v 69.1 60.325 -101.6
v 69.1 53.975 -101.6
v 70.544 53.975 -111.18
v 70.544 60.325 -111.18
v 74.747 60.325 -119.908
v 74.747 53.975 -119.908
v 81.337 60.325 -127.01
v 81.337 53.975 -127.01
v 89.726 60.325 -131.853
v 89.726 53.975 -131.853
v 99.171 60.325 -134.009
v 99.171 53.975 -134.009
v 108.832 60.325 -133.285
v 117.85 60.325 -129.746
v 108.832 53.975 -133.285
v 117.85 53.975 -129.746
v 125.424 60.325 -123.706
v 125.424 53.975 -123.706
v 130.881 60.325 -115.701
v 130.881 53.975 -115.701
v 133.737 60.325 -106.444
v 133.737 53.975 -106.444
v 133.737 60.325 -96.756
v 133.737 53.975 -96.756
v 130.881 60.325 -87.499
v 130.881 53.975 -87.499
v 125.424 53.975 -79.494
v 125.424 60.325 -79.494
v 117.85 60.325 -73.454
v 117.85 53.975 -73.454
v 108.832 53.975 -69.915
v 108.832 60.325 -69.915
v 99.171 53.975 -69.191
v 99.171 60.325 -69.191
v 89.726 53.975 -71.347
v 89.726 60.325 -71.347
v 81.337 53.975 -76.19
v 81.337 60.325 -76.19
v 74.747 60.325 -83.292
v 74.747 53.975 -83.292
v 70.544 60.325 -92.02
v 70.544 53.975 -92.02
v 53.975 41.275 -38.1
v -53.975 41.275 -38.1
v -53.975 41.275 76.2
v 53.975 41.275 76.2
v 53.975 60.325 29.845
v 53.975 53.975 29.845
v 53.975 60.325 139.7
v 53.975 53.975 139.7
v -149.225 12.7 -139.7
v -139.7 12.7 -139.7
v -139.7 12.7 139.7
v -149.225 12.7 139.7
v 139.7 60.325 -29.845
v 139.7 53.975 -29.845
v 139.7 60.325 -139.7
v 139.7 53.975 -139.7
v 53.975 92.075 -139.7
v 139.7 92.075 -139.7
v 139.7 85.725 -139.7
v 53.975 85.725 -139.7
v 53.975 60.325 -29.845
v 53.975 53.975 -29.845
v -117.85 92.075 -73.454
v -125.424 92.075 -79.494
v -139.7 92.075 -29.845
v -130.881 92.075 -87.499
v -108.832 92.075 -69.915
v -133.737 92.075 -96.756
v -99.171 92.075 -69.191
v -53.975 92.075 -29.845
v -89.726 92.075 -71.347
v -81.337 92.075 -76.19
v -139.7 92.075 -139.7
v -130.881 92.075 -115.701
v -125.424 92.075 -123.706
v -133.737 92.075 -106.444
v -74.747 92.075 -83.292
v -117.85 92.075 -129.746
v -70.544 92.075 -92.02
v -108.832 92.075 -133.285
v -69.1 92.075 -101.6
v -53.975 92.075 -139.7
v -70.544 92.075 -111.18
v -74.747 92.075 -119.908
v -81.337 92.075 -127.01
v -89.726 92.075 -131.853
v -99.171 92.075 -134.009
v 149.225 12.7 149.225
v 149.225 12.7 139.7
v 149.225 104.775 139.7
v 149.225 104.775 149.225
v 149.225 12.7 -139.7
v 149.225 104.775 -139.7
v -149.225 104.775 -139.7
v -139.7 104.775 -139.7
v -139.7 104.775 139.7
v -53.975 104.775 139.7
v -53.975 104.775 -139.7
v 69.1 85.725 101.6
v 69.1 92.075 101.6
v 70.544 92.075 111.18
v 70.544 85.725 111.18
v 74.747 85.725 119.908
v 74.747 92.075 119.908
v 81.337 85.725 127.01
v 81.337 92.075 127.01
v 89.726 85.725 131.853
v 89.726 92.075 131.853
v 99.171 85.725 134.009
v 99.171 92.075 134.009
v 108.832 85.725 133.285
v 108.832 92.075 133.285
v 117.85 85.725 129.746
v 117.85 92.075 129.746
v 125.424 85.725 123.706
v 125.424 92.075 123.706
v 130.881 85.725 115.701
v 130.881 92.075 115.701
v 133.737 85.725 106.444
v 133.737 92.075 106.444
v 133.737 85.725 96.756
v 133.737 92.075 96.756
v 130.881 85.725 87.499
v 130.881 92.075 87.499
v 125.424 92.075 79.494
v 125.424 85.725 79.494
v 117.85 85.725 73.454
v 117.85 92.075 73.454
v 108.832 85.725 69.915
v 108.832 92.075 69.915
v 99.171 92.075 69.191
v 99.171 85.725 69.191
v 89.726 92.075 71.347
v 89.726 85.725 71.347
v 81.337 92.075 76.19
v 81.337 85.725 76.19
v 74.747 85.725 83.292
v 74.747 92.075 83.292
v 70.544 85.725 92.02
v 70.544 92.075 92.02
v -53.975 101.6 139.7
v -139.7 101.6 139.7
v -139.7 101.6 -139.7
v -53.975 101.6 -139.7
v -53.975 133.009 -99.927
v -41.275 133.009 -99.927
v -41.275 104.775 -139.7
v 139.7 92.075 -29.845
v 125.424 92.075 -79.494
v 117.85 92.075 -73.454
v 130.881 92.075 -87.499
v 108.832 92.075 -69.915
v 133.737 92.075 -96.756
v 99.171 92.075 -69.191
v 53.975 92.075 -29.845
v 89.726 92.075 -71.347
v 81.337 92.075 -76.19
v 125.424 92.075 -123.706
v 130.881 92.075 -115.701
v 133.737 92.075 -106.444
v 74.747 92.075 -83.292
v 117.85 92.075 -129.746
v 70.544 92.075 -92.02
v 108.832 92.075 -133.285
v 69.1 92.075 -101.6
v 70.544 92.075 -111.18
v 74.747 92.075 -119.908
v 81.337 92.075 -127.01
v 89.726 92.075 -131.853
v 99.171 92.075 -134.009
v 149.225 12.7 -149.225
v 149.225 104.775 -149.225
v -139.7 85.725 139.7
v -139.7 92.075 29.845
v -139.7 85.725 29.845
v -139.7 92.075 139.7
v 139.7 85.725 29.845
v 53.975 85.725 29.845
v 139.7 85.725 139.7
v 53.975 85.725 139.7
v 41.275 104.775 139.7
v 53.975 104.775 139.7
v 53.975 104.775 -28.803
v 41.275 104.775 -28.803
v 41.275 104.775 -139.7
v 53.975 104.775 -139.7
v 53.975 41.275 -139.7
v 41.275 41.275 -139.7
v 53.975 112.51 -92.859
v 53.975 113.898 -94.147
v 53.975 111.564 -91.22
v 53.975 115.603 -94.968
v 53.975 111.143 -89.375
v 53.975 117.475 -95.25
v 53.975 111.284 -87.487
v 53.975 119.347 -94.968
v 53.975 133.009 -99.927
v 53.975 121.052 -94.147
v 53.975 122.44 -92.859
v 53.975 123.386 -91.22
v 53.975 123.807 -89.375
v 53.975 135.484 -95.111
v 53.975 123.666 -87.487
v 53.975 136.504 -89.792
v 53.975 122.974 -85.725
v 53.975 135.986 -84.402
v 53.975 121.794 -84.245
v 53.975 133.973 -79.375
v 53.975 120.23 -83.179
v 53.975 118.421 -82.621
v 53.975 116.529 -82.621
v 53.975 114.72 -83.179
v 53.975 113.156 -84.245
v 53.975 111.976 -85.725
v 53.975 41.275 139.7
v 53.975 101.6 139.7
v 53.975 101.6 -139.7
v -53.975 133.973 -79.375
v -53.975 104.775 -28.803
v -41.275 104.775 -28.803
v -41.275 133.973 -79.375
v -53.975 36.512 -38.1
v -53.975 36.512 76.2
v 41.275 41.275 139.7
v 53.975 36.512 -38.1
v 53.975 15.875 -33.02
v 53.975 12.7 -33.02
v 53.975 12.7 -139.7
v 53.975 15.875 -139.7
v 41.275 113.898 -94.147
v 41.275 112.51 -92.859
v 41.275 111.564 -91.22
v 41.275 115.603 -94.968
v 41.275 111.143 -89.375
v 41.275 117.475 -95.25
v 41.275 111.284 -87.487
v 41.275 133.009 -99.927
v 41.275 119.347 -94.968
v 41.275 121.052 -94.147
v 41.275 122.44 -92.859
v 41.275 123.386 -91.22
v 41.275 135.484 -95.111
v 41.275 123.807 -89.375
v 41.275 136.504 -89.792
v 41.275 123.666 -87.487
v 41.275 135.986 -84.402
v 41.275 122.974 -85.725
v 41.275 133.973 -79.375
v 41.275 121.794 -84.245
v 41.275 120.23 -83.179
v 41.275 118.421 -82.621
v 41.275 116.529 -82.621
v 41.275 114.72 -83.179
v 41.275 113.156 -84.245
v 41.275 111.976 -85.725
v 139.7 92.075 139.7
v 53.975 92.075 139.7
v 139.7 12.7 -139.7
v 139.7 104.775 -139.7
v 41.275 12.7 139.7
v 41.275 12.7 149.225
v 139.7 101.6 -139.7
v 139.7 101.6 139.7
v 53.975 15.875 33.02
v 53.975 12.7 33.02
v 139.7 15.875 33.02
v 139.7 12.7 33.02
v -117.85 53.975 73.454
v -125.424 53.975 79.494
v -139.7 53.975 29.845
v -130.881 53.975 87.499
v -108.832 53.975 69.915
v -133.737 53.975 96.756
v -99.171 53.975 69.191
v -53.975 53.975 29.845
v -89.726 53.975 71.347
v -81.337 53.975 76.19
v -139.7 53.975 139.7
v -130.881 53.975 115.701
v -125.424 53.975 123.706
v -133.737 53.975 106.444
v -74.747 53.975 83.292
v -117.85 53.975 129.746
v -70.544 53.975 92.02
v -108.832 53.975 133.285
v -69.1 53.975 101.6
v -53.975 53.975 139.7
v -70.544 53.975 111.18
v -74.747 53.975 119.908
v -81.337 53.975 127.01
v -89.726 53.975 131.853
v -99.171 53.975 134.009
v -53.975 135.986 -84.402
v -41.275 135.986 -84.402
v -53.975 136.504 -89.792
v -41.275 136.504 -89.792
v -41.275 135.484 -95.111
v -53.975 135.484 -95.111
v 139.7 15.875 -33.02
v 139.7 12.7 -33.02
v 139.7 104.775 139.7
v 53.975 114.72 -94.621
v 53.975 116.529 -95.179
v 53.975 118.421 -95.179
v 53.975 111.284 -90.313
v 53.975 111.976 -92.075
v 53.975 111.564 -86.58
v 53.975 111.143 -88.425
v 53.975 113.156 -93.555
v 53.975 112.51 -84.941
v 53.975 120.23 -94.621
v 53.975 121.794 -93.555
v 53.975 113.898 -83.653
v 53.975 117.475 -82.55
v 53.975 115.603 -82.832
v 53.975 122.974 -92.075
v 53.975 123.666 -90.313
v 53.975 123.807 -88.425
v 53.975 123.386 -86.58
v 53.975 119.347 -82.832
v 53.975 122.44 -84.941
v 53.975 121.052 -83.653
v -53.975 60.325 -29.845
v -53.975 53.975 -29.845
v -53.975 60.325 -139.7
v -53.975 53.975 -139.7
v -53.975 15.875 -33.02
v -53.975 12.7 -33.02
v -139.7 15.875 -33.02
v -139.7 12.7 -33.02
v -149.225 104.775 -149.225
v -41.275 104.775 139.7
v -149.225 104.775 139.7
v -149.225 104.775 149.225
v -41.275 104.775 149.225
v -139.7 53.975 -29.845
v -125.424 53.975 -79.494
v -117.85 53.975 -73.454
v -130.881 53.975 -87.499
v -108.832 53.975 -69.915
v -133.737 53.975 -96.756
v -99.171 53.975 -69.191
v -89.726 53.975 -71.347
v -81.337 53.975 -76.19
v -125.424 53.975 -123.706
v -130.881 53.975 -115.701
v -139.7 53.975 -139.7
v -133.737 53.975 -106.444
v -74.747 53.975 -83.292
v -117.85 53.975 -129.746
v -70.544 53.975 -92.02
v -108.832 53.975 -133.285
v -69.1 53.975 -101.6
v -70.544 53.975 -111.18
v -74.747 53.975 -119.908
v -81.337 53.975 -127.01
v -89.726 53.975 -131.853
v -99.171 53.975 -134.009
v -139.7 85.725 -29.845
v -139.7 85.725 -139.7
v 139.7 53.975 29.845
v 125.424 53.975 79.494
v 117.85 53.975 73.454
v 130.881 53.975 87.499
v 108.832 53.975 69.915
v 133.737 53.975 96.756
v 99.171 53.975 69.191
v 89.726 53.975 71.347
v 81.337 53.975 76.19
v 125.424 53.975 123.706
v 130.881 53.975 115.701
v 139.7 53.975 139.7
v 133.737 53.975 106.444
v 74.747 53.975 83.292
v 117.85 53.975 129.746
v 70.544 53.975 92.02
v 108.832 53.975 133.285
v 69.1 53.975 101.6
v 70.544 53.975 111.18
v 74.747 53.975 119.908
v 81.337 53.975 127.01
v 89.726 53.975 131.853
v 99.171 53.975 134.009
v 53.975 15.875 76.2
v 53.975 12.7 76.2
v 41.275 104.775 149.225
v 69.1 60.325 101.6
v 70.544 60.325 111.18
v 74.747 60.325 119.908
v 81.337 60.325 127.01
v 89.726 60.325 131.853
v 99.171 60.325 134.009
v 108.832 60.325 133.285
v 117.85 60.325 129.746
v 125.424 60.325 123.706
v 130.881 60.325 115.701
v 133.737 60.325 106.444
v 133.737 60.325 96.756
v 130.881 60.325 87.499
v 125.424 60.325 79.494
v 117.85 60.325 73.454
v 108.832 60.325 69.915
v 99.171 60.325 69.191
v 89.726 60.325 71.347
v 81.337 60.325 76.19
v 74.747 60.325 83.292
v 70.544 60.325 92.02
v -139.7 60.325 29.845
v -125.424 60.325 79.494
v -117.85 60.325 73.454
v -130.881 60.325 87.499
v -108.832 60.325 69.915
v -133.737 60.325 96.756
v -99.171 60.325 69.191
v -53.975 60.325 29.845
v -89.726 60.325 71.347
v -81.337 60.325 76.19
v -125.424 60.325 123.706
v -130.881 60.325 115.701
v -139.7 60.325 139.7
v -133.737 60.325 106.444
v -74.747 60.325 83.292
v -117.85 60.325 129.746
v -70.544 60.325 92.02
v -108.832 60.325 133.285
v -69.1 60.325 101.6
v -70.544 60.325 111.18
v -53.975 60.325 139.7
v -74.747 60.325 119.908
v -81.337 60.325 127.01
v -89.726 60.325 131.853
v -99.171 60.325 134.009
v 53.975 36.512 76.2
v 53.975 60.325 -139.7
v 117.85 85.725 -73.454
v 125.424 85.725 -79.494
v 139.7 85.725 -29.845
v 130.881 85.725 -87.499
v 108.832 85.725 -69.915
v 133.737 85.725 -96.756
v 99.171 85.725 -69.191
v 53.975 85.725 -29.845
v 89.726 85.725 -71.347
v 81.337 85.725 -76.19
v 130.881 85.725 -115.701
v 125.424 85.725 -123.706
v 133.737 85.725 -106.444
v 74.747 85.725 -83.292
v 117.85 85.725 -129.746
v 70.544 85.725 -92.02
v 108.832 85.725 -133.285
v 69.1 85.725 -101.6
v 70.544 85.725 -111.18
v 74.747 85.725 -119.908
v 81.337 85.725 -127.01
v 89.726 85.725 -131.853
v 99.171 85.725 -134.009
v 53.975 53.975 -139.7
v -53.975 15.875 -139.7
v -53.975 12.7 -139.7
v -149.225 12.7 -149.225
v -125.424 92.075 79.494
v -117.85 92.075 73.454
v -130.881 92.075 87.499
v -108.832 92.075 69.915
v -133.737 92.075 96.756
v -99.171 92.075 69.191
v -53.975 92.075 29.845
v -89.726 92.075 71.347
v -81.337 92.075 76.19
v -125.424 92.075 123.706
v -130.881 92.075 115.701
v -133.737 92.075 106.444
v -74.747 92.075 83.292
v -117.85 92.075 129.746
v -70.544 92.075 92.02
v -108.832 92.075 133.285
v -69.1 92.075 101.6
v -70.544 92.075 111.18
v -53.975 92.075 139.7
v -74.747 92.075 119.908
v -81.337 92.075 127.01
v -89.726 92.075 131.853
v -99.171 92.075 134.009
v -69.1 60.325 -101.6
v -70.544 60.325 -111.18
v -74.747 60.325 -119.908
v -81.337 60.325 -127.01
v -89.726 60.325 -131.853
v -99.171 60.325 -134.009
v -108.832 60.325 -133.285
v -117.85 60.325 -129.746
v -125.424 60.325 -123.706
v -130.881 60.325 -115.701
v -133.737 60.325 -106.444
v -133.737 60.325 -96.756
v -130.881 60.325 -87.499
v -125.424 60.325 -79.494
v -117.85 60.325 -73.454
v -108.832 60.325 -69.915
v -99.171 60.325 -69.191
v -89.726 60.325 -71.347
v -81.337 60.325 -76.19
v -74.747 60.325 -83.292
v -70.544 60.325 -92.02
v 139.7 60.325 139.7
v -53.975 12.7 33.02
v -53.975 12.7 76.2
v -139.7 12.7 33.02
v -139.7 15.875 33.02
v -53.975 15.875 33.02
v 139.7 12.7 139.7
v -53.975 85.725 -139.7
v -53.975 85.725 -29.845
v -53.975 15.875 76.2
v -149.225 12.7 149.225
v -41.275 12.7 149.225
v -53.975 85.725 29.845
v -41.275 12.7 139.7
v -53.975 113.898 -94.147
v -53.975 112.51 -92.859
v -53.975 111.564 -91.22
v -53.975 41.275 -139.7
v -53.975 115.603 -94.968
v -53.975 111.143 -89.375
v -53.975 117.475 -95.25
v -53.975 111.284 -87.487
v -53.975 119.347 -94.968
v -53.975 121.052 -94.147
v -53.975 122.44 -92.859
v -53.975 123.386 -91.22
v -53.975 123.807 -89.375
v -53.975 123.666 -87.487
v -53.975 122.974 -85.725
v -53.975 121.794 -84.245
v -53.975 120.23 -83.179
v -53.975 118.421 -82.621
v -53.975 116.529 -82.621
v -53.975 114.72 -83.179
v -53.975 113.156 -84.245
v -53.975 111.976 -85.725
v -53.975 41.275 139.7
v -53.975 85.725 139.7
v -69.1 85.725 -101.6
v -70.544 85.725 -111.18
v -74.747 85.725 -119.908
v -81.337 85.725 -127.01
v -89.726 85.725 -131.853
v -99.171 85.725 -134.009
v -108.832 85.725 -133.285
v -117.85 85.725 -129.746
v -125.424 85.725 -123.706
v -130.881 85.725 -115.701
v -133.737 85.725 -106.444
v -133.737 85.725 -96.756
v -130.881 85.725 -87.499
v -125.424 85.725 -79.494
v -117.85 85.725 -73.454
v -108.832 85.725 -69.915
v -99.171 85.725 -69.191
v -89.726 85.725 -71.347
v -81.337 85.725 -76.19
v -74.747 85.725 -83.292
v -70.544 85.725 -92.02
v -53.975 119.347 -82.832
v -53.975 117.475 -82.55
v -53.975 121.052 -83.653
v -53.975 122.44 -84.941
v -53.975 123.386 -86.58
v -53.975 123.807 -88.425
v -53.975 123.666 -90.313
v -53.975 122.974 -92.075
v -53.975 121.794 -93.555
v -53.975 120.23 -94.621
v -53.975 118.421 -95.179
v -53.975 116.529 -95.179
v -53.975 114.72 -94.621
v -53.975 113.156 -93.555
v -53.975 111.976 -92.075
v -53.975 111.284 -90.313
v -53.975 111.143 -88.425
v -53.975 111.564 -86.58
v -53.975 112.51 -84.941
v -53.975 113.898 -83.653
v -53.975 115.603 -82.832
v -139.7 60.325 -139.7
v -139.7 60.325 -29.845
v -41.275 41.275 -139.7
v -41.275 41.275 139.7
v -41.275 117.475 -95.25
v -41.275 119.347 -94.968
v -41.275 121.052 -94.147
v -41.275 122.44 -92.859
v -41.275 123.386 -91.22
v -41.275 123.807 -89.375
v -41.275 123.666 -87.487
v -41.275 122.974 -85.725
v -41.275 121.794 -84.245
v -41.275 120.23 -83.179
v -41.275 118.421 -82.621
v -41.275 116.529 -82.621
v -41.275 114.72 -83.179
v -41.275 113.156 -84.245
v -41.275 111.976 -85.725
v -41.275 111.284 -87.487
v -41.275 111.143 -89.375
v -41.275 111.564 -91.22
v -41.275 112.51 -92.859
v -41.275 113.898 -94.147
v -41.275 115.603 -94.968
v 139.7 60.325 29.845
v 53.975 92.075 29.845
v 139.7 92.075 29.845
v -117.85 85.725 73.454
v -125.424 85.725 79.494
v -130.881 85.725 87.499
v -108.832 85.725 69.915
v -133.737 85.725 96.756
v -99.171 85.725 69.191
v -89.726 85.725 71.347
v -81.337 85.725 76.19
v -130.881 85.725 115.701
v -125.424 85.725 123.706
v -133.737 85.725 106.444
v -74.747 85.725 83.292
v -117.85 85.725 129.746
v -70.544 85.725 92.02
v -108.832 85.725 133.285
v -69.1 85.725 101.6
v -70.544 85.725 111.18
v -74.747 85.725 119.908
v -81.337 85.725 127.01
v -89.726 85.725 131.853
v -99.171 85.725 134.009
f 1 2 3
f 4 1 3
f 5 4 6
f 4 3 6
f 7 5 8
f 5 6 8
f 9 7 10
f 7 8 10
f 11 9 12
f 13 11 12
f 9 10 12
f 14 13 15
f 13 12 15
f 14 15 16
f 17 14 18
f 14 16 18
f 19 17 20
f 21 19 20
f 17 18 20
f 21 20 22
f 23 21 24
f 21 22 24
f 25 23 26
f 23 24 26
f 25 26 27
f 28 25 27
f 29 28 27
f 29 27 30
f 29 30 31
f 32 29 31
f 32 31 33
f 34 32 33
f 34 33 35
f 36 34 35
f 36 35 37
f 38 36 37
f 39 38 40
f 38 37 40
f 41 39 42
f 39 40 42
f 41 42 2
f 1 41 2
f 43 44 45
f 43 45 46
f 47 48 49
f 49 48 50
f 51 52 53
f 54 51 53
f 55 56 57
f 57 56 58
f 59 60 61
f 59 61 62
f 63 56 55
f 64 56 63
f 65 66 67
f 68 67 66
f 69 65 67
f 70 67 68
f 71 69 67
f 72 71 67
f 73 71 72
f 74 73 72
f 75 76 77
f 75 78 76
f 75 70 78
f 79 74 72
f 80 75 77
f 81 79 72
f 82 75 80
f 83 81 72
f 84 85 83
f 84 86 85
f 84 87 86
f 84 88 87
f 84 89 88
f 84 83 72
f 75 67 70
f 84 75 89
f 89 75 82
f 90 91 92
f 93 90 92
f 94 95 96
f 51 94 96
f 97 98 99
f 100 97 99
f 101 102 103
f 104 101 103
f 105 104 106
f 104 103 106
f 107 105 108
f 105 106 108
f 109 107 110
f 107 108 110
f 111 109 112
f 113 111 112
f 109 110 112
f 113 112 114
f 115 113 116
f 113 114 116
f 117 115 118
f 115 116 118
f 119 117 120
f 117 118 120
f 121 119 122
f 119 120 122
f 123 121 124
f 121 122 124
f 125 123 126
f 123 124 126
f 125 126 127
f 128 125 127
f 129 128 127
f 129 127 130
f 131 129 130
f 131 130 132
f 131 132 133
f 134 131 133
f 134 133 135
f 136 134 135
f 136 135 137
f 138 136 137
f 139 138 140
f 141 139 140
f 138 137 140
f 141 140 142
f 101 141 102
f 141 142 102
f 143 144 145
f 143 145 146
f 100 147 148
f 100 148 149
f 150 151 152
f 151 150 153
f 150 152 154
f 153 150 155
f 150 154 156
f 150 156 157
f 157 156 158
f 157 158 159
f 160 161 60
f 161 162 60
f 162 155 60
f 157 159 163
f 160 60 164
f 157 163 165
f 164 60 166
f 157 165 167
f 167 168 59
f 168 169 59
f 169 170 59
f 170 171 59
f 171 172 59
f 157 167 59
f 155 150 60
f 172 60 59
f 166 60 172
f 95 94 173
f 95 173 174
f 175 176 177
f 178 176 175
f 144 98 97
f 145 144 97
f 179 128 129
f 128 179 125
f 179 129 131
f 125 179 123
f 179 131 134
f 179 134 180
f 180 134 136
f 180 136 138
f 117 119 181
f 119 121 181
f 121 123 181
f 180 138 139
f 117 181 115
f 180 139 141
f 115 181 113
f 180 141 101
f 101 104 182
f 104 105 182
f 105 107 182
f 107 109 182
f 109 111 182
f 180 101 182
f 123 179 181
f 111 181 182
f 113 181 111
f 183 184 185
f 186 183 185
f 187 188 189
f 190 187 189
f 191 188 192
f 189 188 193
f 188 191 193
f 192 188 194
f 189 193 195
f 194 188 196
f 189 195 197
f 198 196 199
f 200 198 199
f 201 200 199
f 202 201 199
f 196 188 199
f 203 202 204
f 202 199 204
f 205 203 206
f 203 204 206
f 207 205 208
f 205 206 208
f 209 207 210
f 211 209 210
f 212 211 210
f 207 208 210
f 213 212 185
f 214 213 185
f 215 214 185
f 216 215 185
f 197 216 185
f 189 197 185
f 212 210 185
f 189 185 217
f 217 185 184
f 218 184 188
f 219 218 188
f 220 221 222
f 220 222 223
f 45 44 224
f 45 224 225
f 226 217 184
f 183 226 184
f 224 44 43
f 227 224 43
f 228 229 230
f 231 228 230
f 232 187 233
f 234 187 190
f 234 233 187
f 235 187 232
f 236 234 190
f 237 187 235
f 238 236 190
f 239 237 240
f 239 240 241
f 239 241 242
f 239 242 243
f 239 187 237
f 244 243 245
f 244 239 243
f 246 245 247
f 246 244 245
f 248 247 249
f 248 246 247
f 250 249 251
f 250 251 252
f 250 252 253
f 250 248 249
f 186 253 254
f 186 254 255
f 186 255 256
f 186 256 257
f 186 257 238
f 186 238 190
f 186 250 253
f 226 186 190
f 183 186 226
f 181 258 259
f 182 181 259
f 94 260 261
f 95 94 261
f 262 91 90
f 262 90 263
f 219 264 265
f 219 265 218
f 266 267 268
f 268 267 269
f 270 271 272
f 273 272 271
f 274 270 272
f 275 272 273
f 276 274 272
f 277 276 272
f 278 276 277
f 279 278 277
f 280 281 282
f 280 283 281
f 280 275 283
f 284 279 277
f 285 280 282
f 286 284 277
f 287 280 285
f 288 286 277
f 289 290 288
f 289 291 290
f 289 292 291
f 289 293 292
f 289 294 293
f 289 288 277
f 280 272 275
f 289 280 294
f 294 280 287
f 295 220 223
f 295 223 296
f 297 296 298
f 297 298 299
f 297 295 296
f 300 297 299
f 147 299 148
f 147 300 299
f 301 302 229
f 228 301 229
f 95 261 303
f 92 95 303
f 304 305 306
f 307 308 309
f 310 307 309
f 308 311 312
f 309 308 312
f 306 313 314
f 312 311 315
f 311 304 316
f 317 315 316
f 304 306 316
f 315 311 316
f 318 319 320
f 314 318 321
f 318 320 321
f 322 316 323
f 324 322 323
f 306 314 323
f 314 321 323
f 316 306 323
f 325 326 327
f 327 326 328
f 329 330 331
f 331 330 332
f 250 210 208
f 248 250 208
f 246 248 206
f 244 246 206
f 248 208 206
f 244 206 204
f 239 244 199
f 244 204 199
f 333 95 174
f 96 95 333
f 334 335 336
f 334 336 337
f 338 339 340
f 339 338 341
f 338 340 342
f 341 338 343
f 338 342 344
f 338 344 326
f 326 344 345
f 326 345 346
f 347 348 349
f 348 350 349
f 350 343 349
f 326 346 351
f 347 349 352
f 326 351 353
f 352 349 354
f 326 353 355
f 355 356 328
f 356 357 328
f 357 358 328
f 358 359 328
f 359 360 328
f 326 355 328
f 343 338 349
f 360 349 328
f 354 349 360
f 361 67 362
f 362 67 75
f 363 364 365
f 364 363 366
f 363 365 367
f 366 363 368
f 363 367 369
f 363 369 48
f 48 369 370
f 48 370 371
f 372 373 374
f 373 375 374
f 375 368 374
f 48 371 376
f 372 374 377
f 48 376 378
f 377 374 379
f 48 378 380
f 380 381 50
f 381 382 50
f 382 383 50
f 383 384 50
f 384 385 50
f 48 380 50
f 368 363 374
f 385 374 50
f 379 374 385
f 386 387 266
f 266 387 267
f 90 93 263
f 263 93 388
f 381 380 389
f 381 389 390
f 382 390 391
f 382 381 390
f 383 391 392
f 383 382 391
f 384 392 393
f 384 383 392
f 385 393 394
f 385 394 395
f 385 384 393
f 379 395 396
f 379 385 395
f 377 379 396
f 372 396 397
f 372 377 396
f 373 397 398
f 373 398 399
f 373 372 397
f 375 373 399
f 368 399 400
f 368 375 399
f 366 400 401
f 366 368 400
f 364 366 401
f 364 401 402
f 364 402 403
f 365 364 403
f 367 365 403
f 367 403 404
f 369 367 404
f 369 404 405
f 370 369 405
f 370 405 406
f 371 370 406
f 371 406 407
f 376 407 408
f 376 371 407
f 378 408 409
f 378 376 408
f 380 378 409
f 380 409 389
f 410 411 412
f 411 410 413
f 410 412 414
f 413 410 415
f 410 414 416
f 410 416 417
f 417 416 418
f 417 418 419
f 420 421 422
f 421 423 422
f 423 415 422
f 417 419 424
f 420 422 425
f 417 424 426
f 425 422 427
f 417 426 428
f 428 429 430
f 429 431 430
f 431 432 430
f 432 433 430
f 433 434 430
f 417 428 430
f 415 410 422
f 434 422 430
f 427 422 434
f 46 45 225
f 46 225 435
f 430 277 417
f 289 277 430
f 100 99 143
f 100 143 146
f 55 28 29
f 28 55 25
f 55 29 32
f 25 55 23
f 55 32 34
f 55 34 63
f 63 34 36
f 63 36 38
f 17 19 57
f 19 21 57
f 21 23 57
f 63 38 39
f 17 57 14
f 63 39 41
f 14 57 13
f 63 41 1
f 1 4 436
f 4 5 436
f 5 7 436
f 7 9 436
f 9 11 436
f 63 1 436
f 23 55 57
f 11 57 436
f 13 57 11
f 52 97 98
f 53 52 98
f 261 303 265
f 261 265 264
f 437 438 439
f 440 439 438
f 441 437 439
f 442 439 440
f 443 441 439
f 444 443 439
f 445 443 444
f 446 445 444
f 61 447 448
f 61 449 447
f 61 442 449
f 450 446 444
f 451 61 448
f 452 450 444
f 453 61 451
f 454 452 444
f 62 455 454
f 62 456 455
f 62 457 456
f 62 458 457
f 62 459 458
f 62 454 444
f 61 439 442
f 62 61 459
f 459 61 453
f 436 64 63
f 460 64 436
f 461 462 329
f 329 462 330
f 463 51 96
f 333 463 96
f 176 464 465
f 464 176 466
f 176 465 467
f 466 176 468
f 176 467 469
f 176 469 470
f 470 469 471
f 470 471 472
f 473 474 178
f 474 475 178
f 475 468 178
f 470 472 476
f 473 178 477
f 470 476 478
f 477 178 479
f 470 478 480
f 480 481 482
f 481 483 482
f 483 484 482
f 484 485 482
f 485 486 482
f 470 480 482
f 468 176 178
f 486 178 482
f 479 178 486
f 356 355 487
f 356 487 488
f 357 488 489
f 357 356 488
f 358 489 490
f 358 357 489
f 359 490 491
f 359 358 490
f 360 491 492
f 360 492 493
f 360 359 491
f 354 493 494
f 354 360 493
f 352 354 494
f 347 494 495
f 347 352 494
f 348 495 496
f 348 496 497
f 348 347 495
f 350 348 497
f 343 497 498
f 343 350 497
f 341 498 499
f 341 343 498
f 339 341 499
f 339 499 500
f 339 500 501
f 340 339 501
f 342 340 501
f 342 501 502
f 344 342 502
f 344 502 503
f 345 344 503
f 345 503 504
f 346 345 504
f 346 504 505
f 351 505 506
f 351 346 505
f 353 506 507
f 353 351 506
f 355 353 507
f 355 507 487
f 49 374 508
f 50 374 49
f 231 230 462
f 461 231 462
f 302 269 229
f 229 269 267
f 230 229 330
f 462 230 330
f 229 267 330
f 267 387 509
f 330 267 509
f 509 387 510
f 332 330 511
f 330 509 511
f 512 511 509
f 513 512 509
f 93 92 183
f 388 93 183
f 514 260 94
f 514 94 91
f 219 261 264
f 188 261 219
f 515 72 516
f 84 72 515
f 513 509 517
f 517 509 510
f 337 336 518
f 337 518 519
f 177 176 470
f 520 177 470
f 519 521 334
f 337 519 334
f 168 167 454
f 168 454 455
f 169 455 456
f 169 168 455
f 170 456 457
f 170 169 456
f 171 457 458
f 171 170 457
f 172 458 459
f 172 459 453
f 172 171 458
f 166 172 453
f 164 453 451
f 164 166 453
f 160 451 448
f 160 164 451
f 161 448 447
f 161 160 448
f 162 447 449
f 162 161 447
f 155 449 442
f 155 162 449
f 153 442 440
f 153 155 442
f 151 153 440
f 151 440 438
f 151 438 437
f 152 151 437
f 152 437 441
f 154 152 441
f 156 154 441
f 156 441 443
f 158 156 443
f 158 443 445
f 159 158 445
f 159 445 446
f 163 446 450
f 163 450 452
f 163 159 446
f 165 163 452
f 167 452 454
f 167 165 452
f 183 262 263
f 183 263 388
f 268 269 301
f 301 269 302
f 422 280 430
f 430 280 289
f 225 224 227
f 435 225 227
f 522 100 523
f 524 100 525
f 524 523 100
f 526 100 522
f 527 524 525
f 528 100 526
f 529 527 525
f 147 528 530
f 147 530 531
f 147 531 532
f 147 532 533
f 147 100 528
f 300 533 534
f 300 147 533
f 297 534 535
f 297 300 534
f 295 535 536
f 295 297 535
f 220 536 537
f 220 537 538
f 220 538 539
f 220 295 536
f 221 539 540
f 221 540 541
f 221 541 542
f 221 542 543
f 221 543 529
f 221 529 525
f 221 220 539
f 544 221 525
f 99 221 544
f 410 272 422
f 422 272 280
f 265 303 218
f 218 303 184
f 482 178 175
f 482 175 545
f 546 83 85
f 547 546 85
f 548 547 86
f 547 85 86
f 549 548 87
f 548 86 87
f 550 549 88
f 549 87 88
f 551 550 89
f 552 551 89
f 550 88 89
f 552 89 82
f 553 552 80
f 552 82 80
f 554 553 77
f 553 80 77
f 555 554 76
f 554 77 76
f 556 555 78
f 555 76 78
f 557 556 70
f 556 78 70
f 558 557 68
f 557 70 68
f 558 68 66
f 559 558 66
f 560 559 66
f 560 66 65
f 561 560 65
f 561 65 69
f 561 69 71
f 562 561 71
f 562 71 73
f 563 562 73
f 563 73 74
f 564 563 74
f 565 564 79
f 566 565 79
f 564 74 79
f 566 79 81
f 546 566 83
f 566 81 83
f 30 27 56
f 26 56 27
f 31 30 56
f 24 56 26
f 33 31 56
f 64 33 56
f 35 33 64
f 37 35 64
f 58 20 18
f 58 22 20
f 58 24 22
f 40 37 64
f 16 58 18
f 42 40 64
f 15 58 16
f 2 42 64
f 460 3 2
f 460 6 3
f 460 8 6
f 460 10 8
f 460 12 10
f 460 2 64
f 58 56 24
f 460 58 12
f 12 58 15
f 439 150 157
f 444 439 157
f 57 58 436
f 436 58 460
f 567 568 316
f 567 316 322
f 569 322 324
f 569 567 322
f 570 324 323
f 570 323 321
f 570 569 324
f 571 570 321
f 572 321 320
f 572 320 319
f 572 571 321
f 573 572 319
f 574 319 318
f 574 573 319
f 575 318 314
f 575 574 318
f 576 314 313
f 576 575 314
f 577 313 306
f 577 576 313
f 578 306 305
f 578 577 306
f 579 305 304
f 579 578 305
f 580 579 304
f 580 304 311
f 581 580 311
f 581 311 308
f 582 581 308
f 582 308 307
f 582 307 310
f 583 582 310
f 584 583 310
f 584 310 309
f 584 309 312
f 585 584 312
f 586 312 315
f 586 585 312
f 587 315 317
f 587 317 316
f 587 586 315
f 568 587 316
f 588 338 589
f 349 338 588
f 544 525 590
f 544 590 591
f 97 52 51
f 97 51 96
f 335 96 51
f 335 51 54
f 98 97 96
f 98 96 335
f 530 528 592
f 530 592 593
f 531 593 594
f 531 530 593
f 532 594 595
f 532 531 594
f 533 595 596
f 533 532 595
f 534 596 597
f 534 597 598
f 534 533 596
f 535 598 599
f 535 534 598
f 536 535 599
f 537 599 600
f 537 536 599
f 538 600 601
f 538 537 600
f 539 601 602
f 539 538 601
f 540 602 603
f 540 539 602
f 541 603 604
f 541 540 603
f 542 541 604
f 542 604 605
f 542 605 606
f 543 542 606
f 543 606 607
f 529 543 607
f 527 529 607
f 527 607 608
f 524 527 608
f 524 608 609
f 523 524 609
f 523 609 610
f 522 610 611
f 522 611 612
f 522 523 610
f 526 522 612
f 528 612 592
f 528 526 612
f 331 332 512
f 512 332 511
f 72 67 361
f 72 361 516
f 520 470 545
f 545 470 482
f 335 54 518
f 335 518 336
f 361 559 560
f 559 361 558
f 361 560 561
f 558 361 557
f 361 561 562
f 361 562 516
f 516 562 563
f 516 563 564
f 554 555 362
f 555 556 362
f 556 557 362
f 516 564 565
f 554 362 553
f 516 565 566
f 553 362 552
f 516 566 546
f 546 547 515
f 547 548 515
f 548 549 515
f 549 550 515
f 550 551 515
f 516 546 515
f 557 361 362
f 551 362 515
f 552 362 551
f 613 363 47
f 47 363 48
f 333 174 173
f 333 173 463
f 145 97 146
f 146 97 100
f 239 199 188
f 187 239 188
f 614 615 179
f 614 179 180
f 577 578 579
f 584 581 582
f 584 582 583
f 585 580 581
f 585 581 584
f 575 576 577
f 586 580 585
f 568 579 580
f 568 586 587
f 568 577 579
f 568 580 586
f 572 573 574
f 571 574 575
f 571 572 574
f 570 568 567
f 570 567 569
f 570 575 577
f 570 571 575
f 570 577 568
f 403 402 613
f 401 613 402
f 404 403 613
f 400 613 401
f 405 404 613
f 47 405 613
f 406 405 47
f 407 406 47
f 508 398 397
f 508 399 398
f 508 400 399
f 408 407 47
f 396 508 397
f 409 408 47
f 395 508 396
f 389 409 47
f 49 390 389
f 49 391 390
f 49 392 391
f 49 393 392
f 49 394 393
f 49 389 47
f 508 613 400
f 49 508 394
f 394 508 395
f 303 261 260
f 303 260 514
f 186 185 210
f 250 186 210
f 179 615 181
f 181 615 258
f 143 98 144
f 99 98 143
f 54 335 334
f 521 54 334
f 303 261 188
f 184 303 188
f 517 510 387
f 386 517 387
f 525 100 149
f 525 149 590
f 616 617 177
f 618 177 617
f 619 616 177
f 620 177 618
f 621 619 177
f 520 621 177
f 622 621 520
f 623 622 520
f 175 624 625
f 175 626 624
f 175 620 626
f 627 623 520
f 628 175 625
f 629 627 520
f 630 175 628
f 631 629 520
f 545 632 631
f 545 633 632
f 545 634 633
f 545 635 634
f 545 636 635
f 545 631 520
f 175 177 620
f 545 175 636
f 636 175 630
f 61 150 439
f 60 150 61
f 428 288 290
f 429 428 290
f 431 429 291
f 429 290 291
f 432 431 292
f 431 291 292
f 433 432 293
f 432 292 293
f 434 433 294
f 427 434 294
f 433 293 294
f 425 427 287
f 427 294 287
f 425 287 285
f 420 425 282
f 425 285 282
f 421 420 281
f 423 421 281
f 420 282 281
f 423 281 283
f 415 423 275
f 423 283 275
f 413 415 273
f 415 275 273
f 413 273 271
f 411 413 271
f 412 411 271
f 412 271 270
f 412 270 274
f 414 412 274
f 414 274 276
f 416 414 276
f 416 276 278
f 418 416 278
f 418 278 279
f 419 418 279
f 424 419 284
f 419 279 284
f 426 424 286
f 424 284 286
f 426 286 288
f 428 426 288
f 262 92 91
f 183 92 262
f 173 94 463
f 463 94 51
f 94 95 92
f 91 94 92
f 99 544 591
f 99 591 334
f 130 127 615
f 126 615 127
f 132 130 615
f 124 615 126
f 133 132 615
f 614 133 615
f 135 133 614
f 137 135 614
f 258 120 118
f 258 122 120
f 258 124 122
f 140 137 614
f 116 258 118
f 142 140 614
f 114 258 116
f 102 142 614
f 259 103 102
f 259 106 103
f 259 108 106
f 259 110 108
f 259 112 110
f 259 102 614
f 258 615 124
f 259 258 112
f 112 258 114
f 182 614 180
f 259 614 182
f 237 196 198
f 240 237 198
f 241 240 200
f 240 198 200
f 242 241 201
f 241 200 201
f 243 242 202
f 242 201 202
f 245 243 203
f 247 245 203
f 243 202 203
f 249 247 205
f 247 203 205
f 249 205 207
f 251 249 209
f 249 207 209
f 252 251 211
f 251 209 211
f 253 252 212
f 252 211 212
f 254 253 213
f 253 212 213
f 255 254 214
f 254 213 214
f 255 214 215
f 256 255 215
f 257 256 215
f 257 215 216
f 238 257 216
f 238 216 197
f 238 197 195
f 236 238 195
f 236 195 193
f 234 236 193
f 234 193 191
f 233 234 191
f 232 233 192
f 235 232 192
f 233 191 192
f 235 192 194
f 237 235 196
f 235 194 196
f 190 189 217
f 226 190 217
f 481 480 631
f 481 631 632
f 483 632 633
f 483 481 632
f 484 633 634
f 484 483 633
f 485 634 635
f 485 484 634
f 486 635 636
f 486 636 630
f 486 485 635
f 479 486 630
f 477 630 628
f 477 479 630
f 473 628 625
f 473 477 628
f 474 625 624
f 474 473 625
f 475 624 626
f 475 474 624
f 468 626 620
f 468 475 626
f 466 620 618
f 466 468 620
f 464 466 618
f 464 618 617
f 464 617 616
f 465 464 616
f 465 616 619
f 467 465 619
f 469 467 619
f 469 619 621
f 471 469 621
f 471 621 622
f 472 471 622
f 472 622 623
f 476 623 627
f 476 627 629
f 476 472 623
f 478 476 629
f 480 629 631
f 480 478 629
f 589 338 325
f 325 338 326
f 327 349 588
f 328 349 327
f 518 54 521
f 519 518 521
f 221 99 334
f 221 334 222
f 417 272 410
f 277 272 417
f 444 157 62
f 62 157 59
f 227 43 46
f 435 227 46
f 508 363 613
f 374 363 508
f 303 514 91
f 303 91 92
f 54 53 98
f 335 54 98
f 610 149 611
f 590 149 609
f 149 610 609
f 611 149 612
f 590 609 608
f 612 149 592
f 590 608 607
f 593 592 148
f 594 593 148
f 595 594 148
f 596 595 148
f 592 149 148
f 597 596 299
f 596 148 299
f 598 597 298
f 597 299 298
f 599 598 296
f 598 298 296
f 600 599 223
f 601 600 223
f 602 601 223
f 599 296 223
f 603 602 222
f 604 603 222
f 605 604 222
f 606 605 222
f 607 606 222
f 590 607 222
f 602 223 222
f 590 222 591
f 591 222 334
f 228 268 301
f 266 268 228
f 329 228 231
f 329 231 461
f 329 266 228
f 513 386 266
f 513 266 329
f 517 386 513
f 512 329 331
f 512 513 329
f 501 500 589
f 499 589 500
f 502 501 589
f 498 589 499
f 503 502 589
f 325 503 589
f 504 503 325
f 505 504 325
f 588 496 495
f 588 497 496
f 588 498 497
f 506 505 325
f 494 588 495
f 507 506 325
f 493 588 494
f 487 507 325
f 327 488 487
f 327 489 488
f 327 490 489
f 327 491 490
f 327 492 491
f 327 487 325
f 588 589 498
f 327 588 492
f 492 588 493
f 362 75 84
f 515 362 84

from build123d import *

# Parameters (mm, degrees)
SKETCH3_W           = 85.725
SKETCH3_H           = 109.855
SKETCH3_R           = 32.5
BOSS_EXTRUDE1_DEPTH = 6.35
SKETCH7_R           = 6.35
BOSS_EXTRUDE2_DEPTH = 12.7
SKETCH8_W           = 107.95
SKETCH8_H           = 92.075
BOSS_EXTRUDE3_DEPTH = 9.525
SKETCH10_W          = 279.4
SKETCH10_H          = 92.075
BOSS_EXTRUDE4_DEPTH = 9.525
SKETCH13_W          = 85.725
SKETCH13_H          = 279.4
BOSS_EXTRUDE7_DEPTH = 3.175
SKETCH11_W          = 298.45
SKETCH11_H          = 92.075
BOSS_EXTRUDE5_DEPTH = 9.525
SKETCH12_W          = 107.95
SKETCH12_H          = 114.3
BOSS_EXTRUDE6_DEPTH = 4.7625
BOSS_EXTRUDE8_DEPTH = 3.175
SKETCH15_R          = 6.35
BOSS_EXTRUDE9_DEPTH = 107.95


with BuildPart() as part:
    # Sketch3 → Boss-Extrude1 (new body)
    with BuildSketch(Plane(origin=(0, 53.975, 0), x_dir=(1, 0, 0), z_dir=(0, 1, 0))):
        with Locations((-96.8375, 84.7725)):
            Rectangle(SKETCH3_W, SKETCH3_H)
        with Locations((-101.6, 101.6)):
            Circle(SKETCH3_R, mode=Mode.SUBTRACT)
    extrude(amount=BOSS_EXTRUDE1_DEPTH)


with BuildPart() as body_2:
    # Mirror1: mirrored copy
    add(part.part.mirror(Plane.ZX.offset(73.025)))


with BuildPart() as body_3:
    # Mirror2: mirrored copy
    add(part.part.mirror(Plane.XY))


with BuildPart() as body_4:
    # Mirror2 2: mirrored copy
    add(body_2.part.mirror(Plane.XY))


with BuildPart() as body_5:
    # Sketch7 → Boss-Extrude2 (new body)
    with BuildSketch(Plane(origin=(-53.975, 0, 0), x_dir=(0, 0, -1), z_dir=(1, 0, 0))):
        with BuildLine():
            Line((99.927230191, 133.008920764), (139.7, 104.775))
            Line((139.7, 104.775), (139.7, 41.275))
            Line((139.7, 41.275), (-139.7, 41.275))
            Line((-139.7, 41.275), (-139.7, 104.775))
            Line((-139.7, 104.775), (28.802954744, 104.775))
            Line((28.802954744, 104.775), (79.375, 133.972783942))
            ThreePointArc((79.375, 133.972783942), (89.792430358, 136.504084793), (99.927230191, 133.008920764))
        make_face()
        with Locations((88.9, 117.475)):
            Circle(SKETCH7_R, mode=Mode.SUBTRACT)
    extrude(amount=BOSS_EXTRUDE2_DEPTH)


with BuildPart() as body_6:
    # Sketch8 → Boss-Extrude3 (new body)
    with BuildSketch(Plane.XY.offset(139.7)):
        with Locations((-95.25, 58.7375)):
            Rectangle(SKETCH8_W, SKETCH8_H)
    extrude(amount=BOSS_EXTRUDE3_DEPTH)


with BuildPart() as body_7:
    # Sketch10 → Boss-Extrude4 (new body)
    with BuildSketch(Plane.ZY.offset(139.7)):
        with Locations((0, 58.7375)):
            Rectangle(SKETCH10_W, SKETCH10_H)
    extrude(amount=BOSS_EXTRUDE4_DEPTH)


with BuildPart() as body_8:
    # Sketch13 → Boss-Extrude7 (new body)
    with BuildSketch(Plane(origin=(0, 104.775, 0), x_dir=(1, 0, 0), z_dir=(0, 1, 0))):
        with Locations((-96.8375, 0)):
            Rectangle(SKETCH13_W, SKETCH13_H)
    extrude(amount=-BOSS_EXTRUDE7_DEPTH)


with BuildPart() as body_9:
    # Mirror3: mirrored copy
    add(body_3.part.mirror(Plane(origin=(0, 0, 0), x_dir=(0, 0, 1), z_dir=(1, 0, 0))))


with BuildPart() as body_10:
    # Mirror3 2: mirrored copy
    add(body_4.part.mirror(Plane(origin=(0, 0, 0), x_dir=(0, 0, 1), z_dir=(1, 0, 0))))


with BuildPart() as body_11:
    # Mirror3 3: mirrored copy
    add(part.part.mirror(Plane(origin=(0, 0, 0), x_dir=(0, 0, 1), z_dir=(1, 0, 0))))


with BuildPart() as body_12:
    # Mirror3 4: mirrored copy
    add(body_2.part.mirror(Plane(origin=(0, 0, 0), x_dir=(0, 0, 1), z_dir=(1, 0, 0))))


with BuildPart() as body_13:
    # Mirror3 5: mirrored copy
    add(body_5.part.mirror(Plane(origin=(0, 0, 0), x_dir=(0, 0, 1), z_dir=(1, 0, 0))))


with BuildPart() as body_14:
    # Mirror3 6: mirrored copy
    add(body_7.part.mirror(Plane(origin=(0, 0, 0), x_dir=(0, 0, 1), z_dir=(1, 0, 0))))


with BuildPart() as body_15:
    # Mirror3 7: mirrored copy
    add(body_6.part.mirror(Plane(origin=(0, 0, 0), x_dir=(0, 0, 1), z_dir=(1, 0, 0))))


with BuildPart() as body_16:
    # Mirror3 8: mirrored copy
    add(body_8.part.mirror(Plane(origin=(0, 0, 0), x_dir=(0, 0, 1), z_dir=(1, 0, 0))))


with BuildPart() as body_17:
    # Sketch11 → Boss-Extrude5 (new body)
    with BuildSketch(Plane(origin=(0, 0, -139.7), x_dir=(-1, 0, 0), z_dir=(0, 0, -1))):
        with Locations((0, 58.7375)):
            Rectangle(SKETCH11_W, SKETCH11_H)
    extrude(amount=BOSS_EXTRUDE5_DEPTH)


with BuildPart() as body_18:
    # Sketch12 → Boss-Extrude6 (new body)
    with BuildSketch(Plane.XZ.offset(-41.275)):
        with Locations((0, 19.05)):
            Rectangle(SKETCH12_W, SKETCH12_H)
    extrude(amount=BOSS_EXTRUDE6_DEPTH)


with BuildPart() as body_19:
    # Sketch14 → Boss-Extrude8 (new body)
    with BuildSketch(Plane.XZ.offset(-12.7)):
        Polygon((-139.7, 33.02), (-53.975, 33.02), (-53.975, 76.2), (53.975, 76.2), (53.975, 33.02), (139.7, 33.02), (139.7, -33.02), (53.975, -33.02), (53.975, -139.7), (-53.975, -139.7), (-53.975, -33.02), (-139.7, -33.02), align=None)
    extrude(amount=-BOSS_EXTRUDE8_DEPTH)


with BuildPart() as body_20:
    # Sketch15 → Boss-Extrude9 (new body)
    with BuildSketch(Plane.ZY.offset(53.975)):
        with Locations((-88.9, 117.475)):
            Circle(SKETCH15_R)
    extrude(amount=-BOSS_EXTRUDE9_DEPTH)


solid = Compound([part.part, body_2.part, body_3.part, body_4.part, body_5.part, body_6.part, body_7.part, body_8.part, body_9.part, body_10.part, body_11.part, body_12.part, body_13.part, body_14.part, body_15.part, body_16.part, body_17.part, body_18.part, body_19.part, body_20.part])
